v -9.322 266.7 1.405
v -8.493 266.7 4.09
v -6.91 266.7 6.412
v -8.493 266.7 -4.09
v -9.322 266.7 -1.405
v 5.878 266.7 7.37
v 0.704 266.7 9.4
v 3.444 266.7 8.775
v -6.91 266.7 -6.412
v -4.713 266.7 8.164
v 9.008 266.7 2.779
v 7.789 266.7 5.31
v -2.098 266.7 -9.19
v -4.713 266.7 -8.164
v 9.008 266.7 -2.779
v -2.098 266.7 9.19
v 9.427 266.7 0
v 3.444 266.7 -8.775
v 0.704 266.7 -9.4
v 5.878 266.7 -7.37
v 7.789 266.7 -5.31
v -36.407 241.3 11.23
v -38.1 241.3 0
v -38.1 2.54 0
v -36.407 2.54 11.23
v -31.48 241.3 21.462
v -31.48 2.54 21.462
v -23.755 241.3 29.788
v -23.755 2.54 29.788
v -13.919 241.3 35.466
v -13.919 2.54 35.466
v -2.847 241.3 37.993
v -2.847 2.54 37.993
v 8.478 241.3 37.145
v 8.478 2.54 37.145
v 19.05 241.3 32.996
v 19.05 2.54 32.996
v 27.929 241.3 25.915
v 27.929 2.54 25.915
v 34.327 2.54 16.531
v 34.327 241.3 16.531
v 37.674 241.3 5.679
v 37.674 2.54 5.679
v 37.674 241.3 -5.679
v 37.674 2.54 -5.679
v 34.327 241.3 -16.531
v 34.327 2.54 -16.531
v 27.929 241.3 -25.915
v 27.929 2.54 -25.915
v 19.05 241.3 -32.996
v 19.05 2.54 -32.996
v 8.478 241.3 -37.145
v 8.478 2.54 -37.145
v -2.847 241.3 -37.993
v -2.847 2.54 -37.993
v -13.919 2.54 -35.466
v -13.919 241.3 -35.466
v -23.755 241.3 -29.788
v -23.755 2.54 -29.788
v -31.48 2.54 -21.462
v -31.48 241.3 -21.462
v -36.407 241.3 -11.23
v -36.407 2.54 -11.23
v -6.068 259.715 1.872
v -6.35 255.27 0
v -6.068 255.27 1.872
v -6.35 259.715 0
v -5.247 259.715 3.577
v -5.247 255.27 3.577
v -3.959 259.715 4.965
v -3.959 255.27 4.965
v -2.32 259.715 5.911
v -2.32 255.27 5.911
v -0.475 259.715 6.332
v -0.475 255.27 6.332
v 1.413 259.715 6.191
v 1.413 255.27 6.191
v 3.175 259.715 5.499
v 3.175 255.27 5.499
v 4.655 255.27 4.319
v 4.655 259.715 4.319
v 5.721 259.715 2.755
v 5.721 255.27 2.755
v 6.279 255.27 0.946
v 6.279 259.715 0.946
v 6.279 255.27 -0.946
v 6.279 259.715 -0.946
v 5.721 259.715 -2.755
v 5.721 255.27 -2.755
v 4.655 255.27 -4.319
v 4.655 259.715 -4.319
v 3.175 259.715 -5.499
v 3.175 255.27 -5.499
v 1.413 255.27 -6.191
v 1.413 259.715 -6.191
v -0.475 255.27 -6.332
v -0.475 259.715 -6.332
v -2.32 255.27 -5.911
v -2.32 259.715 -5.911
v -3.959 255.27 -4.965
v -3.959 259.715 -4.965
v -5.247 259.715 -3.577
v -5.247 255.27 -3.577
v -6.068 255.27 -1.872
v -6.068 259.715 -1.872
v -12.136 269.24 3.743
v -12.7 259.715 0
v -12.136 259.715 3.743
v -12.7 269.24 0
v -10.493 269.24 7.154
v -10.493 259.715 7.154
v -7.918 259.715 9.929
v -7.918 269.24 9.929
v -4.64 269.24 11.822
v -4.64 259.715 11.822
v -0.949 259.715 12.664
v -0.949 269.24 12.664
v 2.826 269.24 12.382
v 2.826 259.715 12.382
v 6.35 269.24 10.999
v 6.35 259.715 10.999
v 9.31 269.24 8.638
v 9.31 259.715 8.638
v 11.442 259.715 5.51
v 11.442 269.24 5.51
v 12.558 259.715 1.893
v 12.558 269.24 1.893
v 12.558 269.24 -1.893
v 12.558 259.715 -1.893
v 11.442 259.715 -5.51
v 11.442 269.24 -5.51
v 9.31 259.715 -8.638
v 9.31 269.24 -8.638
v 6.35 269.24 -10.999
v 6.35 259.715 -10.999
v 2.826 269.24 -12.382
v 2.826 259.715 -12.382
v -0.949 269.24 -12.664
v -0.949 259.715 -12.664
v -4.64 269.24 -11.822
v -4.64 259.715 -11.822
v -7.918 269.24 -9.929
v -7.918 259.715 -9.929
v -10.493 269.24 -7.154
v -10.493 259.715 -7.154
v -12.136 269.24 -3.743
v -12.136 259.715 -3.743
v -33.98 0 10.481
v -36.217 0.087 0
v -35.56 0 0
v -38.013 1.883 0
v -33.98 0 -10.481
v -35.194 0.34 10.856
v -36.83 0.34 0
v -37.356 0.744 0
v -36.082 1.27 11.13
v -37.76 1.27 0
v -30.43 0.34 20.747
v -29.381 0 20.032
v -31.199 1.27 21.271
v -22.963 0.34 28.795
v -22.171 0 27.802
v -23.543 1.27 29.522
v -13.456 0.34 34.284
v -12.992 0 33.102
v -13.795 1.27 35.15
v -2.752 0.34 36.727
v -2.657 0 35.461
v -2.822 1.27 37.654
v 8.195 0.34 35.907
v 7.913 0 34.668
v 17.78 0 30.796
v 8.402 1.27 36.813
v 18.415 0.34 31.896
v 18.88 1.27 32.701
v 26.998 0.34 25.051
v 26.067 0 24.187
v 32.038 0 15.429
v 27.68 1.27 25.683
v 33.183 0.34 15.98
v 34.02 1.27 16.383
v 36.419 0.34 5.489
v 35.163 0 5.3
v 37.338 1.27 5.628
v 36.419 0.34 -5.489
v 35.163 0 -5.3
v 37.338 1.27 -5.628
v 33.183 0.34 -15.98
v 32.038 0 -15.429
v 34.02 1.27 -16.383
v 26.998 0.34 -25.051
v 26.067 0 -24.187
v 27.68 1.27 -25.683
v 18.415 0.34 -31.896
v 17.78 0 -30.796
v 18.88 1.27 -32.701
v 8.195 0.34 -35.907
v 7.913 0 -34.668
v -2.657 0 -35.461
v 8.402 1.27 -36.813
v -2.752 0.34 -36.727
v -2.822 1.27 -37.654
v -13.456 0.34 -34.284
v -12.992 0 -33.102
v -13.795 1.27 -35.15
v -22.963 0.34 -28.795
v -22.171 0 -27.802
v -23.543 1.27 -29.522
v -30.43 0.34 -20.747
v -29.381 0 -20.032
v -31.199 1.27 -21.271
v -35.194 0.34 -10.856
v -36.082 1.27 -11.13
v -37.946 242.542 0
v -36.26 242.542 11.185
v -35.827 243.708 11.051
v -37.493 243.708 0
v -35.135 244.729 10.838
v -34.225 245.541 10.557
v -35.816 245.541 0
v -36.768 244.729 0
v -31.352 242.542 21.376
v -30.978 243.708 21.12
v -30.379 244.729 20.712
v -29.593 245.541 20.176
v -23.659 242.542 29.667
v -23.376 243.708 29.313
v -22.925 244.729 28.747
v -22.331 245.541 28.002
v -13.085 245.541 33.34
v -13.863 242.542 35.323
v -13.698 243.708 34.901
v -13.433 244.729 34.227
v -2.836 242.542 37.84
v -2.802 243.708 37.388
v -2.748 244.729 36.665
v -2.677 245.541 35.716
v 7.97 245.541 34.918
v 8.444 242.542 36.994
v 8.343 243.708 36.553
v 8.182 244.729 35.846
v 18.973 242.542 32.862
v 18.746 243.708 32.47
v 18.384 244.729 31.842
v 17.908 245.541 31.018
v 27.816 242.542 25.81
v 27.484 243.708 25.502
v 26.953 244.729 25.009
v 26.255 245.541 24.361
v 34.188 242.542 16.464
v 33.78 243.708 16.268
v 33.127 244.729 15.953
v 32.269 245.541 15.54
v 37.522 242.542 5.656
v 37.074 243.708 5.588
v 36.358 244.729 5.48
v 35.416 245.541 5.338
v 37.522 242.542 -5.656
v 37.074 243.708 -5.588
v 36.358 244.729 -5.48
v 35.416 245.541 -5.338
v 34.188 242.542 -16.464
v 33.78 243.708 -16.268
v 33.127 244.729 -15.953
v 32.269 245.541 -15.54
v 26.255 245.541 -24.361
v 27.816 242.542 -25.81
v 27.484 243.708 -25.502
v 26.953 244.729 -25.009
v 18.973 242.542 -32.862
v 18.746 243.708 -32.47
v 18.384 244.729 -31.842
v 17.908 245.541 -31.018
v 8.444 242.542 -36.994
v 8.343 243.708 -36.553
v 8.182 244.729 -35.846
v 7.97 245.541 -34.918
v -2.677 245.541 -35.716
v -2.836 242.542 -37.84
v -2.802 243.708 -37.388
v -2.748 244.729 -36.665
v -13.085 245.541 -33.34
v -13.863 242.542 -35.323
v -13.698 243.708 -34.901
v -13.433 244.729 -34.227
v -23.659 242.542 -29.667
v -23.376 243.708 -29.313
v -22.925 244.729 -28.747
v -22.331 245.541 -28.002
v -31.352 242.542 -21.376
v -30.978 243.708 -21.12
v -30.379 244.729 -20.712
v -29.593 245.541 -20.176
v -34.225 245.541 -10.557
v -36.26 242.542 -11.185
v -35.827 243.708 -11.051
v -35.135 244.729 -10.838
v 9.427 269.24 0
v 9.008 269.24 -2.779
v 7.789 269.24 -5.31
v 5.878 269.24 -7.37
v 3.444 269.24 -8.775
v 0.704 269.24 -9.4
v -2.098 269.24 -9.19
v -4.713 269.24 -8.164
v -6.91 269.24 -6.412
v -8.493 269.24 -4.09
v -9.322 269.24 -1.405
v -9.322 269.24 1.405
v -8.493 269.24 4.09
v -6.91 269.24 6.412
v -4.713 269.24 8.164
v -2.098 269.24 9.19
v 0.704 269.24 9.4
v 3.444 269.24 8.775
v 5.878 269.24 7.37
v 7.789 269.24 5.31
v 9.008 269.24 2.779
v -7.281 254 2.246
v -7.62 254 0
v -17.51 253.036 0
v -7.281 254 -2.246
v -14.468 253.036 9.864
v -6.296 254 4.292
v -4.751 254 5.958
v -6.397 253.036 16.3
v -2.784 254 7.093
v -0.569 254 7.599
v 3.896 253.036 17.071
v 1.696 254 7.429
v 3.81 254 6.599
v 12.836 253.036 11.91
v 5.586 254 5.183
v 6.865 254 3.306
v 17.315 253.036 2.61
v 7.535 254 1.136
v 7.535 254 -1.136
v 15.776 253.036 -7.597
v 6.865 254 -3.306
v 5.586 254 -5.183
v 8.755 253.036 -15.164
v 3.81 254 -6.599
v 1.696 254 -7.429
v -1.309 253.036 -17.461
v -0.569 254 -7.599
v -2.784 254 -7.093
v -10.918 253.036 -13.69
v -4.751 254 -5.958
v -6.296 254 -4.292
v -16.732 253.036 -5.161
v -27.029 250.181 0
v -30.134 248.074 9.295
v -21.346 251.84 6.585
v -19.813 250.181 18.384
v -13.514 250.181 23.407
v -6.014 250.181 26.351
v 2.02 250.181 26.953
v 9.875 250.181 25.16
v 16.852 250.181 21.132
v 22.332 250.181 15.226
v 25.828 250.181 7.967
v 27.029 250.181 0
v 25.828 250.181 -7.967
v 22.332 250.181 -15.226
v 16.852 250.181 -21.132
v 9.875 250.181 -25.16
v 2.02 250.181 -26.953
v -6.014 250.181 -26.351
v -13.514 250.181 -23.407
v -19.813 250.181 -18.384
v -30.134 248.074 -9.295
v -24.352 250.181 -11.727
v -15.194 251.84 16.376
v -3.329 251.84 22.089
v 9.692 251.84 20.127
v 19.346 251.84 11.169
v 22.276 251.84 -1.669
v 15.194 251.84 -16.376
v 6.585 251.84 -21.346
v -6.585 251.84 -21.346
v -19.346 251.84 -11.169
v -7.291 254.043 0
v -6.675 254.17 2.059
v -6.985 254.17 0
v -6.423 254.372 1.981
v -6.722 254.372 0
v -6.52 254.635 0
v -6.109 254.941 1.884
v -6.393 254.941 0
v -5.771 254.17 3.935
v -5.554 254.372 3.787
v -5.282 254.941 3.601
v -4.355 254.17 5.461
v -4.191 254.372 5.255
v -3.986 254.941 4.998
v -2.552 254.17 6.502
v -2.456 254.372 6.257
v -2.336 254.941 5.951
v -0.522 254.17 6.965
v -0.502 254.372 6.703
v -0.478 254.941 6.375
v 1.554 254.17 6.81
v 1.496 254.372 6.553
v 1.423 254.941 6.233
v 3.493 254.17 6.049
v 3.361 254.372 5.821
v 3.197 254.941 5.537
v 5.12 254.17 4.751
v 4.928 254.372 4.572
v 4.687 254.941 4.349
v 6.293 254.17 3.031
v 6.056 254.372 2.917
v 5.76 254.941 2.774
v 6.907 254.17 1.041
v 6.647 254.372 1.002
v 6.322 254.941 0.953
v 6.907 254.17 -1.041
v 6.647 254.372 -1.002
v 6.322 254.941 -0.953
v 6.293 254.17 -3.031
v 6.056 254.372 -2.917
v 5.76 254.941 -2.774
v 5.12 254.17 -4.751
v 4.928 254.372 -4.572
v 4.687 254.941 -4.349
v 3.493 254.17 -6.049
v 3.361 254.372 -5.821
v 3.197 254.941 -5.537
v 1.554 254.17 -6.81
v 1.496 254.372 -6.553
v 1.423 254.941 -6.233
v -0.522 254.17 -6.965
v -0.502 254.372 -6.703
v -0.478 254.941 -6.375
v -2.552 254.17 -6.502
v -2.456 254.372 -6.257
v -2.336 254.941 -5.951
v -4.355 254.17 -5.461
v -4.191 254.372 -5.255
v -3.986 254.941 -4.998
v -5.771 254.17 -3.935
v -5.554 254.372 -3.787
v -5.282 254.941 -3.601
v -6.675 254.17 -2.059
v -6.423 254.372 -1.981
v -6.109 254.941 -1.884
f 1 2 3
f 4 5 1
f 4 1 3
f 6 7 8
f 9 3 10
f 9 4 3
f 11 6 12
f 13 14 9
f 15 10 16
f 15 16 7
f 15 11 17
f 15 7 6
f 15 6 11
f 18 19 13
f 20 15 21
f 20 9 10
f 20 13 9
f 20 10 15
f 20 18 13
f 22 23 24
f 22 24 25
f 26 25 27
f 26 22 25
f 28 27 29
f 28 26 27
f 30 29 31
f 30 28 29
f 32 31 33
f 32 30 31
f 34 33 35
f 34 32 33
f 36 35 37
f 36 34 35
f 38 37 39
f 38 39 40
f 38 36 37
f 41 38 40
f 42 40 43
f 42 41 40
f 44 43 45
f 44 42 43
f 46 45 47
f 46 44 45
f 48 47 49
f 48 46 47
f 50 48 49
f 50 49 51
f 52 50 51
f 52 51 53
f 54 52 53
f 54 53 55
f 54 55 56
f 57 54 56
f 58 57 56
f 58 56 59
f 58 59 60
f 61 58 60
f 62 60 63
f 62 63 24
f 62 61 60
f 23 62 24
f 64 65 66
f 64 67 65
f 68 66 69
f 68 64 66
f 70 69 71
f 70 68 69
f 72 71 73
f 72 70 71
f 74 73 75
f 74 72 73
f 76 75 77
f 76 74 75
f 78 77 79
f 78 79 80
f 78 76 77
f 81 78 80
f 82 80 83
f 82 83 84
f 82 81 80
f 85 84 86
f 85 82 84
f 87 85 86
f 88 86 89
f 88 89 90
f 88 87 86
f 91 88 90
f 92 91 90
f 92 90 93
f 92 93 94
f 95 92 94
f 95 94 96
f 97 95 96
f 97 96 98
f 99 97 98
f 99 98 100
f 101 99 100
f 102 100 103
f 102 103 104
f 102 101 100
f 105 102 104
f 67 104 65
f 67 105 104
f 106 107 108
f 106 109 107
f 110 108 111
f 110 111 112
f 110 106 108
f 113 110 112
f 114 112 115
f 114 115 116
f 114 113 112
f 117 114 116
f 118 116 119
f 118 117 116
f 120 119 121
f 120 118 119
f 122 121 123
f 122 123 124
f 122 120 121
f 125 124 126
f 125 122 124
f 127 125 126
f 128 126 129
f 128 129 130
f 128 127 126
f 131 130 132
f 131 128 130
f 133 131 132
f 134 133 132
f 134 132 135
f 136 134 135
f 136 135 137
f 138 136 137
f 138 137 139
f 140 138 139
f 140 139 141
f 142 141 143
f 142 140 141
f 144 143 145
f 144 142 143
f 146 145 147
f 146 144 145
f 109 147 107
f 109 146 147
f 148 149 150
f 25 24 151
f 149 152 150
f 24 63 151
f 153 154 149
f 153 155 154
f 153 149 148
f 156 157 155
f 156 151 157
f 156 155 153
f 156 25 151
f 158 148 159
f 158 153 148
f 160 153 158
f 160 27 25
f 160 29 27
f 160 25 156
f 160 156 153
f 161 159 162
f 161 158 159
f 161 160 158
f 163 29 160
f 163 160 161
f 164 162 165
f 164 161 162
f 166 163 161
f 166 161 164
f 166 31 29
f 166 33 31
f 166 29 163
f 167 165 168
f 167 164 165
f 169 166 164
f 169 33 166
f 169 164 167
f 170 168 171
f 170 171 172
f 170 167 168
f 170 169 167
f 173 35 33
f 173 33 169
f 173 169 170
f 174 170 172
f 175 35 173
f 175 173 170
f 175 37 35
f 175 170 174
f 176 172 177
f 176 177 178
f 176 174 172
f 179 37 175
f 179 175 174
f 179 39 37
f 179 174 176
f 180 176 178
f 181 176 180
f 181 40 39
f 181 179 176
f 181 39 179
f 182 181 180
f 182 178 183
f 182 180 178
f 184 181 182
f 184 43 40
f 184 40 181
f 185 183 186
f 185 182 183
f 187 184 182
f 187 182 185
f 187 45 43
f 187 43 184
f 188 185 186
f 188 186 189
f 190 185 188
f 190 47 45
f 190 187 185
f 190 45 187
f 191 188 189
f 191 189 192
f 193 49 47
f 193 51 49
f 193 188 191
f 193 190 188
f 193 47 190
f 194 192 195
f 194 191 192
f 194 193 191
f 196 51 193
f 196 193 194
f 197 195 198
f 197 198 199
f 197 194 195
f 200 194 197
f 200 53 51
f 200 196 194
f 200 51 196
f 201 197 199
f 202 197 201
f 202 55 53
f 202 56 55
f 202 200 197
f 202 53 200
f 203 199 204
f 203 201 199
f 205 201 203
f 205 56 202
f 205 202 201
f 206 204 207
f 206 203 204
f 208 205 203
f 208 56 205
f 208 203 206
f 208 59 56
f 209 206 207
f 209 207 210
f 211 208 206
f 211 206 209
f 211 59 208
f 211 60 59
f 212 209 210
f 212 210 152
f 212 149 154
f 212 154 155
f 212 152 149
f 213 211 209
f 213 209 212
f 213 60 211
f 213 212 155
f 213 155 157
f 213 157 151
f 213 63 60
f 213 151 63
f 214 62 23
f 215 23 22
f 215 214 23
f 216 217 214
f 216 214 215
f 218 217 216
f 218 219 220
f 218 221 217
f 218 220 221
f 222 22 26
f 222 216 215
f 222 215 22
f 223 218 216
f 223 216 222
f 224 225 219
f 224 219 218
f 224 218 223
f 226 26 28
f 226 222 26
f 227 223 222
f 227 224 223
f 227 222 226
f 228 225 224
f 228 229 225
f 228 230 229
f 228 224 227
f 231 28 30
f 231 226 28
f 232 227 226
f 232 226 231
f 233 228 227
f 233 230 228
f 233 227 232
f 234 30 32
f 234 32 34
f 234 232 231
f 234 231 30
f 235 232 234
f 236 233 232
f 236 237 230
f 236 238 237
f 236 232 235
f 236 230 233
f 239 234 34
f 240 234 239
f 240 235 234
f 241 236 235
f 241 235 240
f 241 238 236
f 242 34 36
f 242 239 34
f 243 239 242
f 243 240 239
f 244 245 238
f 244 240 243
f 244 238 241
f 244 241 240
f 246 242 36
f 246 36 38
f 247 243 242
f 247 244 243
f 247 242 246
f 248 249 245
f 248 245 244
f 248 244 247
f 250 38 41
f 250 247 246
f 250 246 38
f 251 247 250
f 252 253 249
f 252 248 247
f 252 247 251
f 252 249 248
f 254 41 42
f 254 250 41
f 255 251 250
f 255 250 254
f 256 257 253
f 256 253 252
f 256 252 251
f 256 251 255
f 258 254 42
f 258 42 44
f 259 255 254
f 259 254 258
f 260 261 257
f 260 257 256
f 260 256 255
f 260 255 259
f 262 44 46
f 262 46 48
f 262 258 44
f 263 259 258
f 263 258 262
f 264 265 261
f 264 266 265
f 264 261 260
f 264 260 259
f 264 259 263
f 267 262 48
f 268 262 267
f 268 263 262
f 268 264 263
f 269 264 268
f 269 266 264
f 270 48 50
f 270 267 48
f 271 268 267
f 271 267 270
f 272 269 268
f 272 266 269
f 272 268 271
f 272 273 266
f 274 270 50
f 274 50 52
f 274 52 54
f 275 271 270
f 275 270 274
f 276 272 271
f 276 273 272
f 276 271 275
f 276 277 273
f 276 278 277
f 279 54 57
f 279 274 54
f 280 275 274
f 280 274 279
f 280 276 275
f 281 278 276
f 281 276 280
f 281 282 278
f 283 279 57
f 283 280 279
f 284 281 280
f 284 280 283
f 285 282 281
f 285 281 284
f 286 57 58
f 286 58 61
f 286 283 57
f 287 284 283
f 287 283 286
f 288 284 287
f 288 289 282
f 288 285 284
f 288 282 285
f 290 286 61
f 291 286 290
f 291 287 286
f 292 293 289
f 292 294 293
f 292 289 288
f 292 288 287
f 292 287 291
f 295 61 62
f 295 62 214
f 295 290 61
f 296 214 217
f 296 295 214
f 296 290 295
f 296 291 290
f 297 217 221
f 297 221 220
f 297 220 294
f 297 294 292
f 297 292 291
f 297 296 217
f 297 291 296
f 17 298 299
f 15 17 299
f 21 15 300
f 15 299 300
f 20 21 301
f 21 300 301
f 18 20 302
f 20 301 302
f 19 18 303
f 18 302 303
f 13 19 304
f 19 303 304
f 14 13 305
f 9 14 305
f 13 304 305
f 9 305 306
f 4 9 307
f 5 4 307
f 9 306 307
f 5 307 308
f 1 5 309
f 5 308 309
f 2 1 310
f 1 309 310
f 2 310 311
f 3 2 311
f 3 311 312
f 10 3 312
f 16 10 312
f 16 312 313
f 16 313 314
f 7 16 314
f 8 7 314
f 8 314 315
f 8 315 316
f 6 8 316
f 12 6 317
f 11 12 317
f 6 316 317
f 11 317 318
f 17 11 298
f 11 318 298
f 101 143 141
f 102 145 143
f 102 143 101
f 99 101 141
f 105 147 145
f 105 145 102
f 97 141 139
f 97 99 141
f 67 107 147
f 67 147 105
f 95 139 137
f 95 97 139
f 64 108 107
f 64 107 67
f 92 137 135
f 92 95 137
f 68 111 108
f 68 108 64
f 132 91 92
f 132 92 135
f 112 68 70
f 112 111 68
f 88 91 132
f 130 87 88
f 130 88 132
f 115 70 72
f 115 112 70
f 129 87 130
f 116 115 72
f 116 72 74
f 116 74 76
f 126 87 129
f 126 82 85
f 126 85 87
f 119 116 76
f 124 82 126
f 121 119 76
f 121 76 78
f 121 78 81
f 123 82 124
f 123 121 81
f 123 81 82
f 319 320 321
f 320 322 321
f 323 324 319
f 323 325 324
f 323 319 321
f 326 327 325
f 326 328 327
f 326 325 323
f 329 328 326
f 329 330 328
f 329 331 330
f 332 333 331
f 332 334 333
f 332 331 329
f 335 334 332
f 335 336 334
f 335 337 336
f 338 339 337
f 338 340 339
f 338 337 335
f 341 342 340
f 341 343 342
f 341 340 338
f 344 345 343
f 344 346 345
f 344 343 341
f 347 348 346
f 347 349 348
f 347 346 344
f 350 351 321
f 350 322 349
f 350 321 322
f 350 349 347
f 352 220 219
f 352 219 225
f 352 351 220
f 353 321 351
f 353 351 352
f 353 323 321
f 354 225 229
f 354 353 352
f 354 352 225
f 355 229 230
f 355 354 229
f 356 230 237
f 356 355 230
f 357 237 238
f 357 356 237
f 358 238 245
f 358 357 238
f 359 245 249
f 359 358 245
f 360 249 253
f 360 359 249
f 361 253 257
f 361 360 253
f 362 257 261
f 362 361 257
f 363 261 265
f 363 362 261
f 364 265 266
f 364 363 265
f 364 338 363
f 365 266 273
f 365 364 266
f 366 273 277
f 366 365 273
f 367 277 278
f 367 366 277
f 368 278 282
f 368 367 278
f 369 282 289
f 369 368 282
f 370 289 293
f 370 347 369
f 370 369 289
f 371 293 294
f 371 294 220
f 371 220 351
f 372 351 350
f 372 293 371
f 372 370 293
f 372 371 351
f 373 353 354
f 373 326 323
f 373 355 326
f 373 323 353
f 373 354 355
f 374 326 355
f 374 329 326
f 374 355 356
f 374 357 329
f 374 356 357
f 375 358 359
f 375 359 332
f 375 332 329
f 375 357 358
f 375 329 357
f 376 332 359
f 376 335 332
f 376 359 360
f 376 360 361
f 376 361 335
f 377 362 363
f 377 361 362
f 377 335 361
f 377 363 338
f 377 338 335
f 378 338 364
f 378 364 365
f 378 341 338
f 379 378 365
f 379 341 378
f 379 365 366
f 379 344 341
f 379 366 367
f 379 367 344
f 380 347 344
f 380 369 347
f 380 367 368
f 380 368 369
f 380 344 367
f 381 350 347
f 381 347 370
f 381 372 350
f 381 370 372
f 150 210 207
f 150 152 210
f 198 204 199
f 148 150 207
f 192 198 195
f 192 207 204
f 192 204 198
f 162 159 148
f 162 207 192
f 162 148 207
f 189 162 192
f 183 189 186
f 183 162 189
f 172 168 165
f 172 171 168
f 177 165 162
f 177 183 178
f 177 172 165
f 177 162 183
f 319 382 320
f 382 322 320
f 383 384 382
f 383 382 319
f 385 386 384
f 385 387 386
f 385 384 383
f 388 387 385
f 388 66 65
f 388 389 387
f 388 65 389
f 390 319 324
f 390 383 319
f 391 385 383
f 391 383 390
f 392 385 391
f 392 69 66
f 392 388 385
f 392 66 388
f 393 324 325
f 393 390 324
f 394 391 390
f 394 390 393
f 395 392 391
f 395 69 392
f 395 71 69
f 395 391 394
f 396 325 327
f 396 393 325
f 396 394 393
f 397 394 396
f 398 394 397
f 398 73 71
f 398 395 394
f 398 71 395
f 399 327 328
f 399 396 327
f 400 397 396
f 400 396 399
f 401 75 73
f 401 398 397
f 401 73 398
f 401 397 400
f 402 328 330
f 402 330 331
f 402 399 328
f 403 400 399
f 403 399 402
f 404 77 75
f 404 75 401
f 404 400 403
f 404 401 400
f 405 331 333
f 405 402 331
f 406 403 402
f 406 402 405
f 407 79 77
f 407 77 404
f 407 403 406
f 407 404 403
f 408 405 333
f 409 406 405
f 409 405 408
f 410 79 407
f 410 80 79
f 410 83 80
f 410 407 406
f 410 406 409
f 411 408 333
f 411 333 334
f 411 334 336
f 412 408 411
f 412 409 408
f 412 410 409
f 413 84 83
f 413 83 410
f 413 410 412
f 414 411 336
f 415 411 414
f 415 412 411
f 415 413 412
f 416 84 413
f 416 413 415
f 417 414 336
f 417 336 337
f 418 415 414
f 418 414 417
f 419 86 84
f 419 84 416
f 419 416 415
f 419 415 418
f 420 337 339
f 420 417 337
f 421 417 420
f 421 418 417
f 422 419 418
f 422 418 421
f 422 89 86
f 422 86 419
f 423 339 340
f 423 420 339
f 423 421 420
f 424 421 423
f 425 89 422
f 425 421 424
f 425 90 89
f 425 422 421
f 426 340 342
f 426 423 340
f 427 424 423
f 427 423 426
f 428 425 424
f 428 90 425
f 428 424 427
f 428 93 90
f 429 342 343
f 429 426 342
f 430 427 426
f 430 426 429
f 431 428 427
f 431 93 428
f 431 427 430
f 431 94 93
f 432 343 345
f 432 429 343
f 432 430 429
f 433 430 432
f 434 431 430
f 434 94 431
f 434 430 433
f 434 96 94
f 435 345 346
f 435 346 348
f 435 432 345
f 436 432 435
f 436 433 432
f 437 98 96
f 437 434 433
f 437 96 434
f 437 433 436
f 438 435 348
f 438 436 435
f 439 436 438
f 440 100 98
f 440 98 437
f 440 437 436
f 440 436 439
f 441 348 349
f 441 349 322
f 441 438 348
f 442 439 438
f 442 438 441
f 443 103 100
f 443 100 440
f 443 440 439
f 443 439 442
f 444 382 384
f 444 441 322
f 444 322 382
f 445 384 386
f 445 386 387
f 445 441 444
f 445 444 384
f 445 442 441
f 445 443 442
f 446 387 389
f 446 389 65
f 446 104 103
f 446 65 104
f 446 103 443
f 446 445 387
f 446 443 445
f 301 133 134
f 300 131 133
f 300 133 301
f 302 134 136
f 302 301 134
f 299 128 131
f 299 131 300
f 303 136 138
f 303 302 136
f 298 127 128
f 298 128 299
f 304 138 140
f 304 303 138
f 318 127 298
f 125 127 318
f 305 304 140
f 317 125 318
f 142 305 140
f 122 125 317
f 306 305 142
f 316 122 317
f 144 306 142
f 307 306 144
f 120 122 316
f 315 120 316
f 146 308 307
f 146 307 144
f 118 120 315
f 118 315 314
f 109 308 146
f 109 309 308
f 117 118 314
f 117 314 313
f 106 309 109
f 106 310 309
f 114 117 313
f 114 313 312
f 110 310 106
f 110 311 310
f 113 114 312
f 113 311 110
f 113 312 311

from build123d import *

# Parameters (mm, degrees)
FILLET1_R          = 2.54
SKETCH2_R          = 9.426821905
CUT_EXTRUDE1_DEPTH = 2.54


with BuildPart() as part:
    # Sketch1 → Revolve1 (revolve)
    with BuildSketch(Plane.XY):
        with BuildLine():
            Line((0, 0), (-38.1, 0))
            Line((-38.1, 0), (-38.1, 241.3))
            ThreePointArc((-38.1, 241.3), (-37.492793188, 243.708427101), (-35.816330275, 245.541100917))
            ThreePointArc((-35.816330275, 245.541100917), (-22.338916525, 251.83972175), (-7.62, 254))
            ThreePointArc((-7.62, 254), (-6.721974388, 254.371974388), (-6.35, 255.27))
            Line((-6.35, 255.27), (-6.35, 259.715))
            Line((-6.35, 259.715), (-12.7, 259.715))
            Line((-12.7, 259.715), (-12.7, 269.24))
            Line((-12.7, 269.24), (0, 269.24))
            Line((0, 269.24), (0, 0))
        make_face()
    revolve(axis=Axis((0, 0, 0), (0, 1, 0)))

    # Fillet1
    fillet1_edges = [part.edges().sort_by_distance(p)[0] for p in [
        (38.1, 0, 0),
    ]]
    fillet(fillet1_edges, radius=FILLET1_R)

    # Sketch2 → Cut-Extrude1 (cut)
    with BuildSketch(Plane(origin=(0, 269.24, 0), x_dir=(1, 0, 0), z_dir=(0, 1, 0))):
        Circle(SKETCH2_R)
    extrude(amount=-CUT_EXTRUDE1_DEPTH, mode=Mode.SUBTRACT)


solid = part.part
